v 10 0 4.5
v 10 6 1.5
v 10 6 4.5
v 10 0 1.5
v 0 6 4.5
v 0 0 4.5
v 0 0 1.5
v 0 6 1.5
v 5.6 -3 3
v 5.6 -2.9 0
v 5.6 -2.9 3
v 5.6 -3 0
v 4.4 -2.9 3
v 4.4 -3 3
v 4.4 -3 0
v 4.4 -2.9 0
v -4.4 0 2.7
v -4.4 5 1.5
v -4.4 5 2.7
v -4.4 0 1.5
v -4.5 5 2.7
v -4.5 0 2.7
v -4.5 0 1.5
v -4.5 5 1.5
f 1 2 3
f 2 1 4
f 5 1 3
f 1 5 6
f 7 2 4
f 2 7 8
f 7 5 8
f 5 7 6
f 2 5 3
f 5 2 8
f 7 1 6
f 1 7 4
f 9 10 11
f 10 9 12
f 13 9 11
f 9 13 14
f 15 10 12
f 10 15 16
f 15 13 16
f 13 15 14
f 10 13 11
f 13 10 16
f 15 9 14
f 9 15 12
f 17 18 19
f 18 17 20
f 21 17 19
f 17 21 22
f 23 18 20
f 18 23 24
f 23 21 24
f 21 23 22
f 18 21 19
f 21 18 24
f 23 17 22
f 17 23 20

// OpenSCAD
// Define variables
cafe_width = 6; // meters
cafe_length = 10; // meters
cafe_height = 3; // meters
door_width = 1.2; // meters
window_width = 1; // meters
window_height = 1.2; // meters

// Create the cafe building
translate([0,0,cafe_height/2]) cube([cafe_length,cafe_width,cafe_height]);

// Create the door
translate([cafe_length/2-door_width/2,-(cafe_width/2),0]) cube([door_width,0.1,cafe_height]);

// Create the windows
translate([-(cafe_length/2)+window_width/2,0,cafe_height/2]) cube([0.1,cafe_width-window_width,window_height]);
translate([0,(cafe_width/2)-window_width/2,cafe_height/2]) cube([cafe_length-window_width,0.1,window_height]);
